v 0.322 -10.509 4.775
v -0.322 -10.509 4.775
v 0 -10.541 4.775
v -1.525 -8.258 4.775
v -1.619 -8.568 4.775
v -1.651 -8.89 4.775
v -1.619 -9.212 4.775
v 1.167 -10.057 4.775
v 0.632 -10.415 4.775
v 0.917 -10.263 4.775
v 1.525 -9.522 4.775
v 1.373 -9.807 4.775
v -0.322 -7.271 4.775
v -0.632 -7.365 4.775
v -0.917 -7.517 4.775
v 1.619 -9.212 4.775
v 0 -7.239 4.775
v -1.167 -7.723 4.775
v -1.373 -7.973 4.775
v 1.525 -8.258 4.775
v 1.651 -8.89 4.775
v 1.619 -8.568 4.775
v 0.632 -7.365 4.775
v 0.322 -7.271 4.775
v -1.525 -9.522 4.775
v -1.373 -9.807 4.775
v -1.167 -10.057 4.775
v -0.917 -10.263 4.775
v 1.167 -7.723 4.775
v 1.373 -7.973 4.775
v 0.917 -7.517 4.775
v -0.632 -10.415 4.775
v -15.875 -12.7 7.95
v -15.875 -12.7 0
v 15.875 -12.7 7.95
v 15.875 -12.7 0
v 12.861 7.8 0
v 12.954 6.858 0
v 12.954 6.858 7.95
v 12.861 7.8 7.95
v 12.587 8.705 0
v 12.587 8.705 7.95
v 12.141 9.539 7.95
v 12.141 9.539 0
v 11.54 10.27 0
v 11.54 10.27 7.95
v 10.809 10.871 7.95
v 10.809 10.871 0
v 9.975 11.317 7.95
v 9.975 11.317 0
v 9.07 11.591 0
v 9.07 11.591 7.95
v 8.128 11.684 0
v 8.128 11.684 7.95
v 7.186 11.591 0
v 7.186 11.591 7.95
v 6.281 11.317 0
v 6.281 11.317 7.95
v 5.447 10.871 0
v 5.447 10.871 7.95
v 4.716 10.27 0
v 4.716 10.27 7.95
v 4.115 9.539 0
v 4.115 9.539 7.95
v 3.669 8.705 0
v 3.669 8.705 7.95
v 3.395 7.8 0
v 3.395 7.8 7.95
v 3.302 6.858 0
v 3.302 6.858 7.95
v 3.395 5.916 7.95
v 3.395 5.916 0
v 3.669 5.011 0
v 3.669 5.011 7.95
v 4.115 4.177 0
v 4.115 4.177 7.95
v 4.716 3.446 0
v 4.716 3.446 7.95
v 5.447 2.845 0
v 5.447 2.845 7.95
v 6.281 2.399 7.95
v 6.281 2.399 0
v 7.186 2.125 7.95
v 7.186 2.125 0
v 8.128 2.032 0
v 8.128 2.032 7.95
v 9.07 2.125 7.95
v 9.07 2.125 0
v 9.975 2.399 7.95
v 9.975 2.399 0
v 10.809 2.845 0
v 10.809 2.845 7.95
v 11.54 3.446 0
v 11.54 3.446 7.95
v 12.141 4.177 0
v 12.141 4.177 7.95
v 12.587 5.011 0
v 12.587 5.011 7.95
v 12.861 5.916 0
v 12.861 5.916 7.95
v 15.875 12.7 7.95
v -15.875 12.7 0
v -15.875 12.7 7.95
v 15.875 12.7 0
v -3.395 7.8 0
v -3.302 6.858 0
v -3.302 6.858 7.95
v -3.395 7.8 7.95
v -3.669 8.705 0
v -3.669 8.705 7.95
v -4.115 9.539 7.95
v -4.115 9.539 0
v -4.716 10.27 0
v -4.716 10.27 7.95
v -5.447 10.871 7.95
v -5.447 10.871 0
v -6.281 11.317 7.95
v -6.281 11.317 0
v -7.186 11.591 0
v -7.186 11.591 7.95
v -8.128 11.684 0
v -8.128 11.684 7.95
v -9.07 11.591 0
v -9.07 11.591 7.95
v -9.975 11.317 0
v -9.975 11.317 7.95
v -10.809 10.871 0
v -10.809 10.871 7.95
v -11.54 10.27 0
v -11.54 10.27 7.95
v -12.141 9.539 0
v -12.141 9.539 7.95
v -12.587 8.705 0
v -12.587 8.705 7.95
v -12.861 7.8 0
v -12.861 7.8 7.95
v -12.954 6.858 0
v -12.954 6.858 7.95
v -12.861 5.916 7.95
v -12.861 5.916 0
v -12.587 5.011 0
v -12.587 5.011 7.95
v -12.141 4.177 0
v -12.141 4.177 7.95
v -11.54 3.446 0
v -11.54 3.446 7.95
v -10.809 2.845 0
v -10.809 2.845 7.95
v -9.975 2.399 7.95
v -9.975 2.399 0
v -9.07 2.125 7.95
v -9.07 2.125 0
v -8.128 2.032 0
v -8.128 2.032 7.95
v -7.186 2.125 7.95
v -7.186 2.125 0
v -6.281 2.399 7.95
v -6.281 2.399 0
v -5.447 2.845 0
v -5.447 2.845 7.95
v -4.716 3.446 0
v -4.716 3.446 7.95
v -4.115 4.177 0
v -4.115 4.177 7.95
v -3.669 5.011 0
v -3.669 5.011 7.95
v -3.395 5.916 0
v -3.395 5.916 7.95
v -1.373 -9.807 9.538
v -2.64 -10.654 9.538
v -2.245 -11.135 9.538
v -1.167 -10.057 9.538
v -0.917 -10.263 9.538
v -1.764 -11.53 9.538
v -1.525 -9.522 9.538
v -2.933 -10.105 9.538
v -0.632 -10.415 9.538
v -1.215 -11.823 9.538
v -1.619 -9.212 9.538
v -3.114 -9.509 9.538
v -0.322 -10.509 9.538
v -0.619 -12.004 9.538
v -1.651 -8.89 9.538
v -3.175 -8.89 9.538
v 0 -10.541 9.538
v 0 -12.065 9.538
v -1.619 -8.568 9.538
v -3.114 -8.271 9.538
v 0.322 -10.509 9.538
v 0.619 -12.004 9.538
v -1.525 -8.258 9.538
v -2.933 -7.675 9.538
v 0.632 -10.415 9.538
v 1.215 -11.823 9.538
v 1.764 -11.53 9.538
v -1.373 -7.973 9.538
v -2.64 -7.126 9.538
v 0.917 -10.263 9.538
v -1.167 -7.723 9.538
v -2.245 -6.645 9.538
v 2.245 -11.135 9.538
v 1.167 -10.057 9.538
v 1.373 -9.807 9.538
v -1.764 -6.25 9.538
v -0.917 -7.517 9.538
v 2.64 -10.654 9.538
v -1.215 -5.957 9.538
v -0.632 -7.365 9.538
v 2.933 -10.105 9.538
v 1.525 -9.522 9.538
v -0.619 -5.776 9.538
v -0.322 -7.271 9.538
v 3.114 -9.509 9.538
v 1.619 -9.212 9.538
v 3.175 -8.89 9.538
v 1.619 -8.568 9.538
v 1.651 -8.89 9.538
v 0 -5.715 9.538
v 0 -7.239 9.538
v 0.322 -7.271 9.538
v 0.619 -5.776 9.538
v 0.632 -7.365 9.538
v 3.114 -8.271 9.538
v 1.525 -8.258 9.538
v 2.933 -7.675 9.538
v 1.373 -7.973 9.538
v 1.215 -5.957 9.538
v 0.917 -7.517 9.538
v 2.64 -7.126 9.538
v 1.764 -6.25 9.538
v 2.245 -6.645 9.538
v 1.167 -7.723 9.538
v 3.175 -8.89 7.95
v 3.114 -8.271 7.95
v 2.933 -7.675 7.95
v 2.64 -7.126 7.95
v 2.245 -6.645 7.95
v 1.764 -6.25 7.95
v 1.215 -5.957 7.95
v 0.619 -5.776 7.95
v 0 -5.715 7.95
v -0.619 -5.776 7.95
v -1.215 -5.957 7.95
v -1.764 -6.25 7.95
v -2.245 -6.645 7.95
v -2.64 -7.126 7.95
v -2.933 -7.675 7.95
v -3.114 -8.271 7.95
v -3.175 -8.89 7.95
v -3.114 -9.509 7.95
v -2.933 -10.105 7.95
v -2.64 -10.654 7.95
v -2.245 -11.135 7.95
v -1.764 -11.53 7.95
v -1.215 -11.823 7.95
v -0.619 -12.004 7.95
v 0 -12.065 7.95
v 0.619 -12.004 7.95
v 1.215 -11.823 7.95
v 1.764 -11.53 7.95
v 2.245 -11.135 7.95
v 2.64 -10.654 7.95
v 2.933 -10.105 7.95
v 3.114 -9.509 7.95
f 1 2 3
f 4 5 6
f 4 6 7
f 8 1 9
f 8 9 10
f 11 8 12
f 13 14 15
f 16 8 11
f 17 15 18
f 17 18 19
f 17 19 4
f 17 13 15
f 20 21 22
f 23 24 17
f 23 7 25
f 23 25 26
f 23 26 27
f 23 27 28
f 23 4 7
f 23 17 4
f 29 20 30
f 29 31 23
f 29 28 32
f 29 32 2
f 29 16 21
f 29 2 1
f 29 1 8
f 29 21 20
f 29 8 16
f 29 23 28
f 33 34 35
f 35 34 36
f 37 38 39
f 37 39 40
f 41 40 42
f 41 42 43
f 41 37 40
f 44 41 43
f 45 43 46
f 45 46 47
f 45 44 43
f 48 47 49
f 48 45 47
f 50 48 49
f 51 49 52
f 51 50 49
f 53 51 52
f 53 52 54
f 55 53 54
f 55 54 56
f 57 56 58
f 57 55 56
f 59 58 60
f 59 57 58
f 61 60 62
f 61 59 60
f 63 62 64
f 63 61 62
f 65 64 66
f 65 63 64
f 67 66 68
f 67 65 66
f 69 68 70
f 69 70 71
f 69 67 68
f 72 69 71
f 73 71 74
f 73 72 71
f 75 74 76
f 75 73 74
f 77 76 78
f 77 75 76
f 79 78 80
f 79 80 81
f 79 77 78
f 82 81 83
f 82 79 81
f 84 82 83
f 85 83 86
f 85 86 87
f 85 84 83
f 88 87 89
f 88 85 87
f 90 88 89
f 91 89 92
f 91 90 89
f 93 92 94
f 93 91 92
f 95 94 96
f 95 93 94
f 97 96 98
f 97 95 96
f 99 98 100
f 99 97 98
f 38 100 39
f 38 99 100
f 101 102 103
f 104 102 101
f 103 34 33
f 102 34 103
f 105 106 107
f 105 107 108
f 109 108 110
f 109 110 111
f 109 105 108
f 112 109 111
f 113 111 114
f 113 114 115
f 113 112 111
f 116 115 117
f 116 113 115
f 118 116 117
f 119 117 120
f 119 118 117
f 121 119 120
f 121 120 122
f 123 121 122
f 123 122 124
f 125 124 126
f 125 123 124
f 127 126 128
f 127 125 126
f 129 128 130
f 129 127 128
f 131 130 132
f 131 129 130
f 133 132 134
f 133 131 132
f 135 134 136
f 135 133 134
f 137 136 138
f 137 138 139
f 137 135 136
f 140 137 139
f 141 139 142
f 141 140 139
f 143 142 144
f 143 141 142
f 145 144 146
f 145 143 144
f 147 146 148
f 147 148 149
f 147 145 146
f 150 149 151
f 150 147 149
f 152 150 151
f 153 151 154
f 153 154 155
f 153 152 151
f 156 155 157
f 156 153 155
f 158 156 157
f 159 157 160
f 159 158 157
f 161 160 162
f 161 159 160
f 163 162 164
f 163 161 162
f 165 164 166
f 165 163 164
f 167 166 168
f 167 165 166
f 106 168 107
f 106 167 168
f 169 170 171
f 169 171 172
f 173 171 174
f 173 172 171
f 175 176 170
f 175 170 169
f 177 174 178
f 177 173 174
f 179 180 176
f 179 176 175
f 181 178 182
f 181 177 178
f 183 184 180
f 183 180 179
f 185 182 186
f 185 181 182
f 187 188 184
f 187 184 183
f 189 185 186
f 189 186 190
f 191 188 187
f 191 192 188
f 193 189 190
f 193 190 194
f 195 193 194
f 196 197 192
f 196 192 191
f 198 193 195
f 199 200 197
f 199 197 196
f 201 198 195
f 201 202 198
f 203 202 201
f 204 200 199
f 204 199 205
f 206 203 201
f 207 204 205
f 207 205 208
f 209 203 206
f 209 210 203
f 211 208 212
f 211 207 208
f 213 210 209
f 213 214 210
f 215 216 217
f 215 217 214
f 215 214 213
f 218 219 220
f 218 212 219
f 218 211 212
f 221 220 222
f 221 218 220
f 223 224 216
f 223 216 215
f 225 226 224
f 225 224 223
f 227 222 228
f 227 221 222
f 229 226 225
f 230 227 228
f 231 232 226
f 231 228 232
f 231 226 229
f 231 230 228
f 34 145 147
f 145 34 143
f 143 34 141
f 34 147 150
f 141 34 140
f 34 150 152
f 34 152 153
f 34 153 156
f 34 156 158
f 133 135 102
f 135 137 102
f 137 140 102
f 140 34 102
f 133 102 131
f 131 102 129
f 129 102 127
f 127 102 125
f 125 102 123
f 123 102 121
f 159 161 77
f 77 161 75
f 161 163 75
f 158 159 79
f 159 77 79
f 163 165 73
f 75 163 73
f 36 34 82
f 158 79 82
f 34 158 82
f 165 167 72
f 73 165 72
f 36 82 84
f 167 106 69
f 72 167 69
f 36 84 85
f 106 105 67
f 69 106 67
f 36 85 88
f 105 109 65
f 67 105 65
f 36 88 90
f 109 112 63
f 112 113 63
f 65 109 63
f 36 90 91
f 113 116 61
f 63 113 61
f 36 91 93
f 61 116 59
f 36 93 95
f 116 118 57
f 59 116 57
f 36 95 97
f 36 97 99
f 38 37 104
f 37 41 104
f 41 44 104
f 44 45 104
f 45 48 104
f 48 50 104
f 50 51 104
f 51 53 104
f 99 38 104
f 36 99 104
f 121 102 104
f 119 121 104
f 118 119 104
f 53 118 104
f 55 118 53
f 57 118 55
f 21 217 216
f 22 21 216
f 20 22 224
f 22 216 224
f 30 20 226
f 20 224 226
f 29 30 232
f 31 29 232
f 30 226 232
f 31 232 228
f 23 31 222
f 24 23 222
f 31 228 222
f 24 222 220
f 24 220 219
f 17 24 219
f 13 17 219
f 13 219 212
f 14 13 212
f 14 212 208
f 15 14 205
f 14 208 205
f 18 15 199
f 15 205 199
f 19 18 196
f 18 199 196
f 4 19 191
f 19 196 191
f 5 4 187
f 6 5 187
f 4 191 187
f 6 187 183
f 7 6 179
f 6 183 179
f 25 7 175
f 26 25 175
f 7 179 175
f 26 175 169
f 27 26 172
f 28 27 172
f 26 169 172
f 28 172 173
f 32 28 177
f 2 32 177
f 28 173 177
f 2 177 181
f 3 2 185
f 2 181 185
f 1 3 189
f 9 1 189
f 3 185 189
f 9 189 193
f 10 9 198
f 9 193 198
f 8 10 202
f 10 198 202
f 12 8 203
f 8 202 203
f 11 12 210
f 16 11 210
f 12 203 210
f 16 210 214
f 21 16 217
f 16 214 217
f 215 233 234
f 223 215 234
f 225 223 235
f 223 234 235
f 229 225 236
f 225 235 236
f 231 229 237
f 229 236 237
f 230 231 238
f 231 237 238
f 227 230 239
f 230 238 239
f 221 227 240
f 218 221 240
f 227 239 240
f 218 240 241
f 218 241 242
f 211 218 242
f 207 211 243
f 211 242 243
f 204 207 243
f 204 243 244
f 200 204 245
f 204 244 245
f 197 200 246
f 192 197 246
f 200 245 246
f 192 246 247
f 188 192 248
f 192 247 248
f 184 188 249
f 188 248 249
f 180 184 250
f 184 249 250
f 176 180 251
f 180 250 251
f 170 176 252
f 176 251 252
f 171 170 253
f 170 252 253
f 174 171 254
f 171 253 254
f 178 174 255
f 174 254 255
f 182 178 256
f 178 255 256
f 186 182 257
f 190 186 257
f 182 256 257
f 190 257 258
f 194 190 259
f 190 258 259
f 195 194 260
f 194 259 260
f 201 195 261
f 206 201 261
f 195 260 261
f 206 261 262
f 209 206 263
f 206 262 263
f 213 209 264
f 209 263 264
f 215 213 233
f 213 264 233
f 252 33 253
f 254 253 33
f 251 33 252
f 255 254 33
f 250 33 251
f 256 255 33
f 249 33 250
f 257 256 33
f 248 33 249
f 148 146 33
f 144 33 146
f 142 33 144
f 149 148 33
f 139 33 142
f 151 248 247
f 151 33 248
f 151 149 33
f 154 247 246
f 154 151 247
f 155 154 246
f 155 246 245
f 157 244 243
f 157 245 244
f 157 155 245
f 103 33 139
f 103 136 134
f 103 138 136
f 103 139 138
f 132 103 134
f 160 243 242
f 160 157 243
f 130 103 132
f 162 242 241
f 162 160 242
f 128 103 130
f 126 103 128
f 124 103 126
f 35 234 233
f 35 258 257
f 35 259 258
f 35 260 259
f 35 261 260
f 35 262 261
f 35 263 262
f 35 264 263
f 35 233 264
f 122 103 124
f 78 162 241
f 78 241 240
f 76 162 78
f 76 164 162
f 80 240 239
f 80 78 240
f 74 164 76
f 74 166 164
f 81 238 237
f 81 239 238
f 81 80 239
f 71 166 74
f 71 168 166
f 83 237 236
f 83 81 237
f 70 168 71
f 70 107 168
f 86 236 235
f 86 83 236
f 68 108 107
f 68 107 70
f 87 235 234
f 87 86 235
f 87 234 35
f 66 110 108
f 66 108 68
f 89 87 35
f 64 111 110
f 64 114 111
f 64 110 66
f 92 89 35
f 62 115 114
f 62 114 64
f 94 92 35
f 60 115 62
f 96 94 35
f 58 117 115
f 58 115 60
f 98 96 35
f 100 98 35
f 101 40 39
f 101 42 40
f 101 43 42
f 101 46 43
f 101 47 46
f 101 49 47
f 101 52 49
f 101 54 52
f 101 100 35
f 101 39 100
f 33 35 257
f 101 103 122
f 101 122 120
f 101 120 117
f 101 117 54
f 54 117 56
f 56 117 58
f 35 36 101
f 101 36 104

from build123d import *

# Parameters (mm, degrees)
F0_W     = 31.75
F0_H     = 25.4
F0_R     = 4.826
F1_DEPTH = 7.9502
F2_R     = 3.175
F3_DEPTH = 1.5875
F4_R     = 1.651
F5_DEPTH = 4.7625


with BuildPart() as f1:
    # F0 (on Top) → F1 (new body)
    with BuildSketch(Plane.XY):
        Rectangle(F0_W, F0_H)
        with Locations((-8.128, 6.858)):
            Circle(F0_R, mode=Mode.SUBTRACT)
        with Locations((8.128, 6.858)):
            Circle(F0_R, mode=Mode.SUBTRACT)
    extrude(amount=F1_DEPTH)

    # F2 (on face) → F3 (join)
    with BuildSketch(Plane.XY.offset(7.9502)):
        with Locations((0, -8.89)):
            Circle(F2_R)
    extrude(amount=F3_DEPTH)

    # F4 (on face) → F5 (cut)
    with BuildSketch(Plane.XY.offset(9.5377)):
        with Locations((0, -8.89)):
            Circle(F4_R)
    extrude(amount=-F5_DEPTH, mode=Mode.SUBTRACT)


solid = f1.part
